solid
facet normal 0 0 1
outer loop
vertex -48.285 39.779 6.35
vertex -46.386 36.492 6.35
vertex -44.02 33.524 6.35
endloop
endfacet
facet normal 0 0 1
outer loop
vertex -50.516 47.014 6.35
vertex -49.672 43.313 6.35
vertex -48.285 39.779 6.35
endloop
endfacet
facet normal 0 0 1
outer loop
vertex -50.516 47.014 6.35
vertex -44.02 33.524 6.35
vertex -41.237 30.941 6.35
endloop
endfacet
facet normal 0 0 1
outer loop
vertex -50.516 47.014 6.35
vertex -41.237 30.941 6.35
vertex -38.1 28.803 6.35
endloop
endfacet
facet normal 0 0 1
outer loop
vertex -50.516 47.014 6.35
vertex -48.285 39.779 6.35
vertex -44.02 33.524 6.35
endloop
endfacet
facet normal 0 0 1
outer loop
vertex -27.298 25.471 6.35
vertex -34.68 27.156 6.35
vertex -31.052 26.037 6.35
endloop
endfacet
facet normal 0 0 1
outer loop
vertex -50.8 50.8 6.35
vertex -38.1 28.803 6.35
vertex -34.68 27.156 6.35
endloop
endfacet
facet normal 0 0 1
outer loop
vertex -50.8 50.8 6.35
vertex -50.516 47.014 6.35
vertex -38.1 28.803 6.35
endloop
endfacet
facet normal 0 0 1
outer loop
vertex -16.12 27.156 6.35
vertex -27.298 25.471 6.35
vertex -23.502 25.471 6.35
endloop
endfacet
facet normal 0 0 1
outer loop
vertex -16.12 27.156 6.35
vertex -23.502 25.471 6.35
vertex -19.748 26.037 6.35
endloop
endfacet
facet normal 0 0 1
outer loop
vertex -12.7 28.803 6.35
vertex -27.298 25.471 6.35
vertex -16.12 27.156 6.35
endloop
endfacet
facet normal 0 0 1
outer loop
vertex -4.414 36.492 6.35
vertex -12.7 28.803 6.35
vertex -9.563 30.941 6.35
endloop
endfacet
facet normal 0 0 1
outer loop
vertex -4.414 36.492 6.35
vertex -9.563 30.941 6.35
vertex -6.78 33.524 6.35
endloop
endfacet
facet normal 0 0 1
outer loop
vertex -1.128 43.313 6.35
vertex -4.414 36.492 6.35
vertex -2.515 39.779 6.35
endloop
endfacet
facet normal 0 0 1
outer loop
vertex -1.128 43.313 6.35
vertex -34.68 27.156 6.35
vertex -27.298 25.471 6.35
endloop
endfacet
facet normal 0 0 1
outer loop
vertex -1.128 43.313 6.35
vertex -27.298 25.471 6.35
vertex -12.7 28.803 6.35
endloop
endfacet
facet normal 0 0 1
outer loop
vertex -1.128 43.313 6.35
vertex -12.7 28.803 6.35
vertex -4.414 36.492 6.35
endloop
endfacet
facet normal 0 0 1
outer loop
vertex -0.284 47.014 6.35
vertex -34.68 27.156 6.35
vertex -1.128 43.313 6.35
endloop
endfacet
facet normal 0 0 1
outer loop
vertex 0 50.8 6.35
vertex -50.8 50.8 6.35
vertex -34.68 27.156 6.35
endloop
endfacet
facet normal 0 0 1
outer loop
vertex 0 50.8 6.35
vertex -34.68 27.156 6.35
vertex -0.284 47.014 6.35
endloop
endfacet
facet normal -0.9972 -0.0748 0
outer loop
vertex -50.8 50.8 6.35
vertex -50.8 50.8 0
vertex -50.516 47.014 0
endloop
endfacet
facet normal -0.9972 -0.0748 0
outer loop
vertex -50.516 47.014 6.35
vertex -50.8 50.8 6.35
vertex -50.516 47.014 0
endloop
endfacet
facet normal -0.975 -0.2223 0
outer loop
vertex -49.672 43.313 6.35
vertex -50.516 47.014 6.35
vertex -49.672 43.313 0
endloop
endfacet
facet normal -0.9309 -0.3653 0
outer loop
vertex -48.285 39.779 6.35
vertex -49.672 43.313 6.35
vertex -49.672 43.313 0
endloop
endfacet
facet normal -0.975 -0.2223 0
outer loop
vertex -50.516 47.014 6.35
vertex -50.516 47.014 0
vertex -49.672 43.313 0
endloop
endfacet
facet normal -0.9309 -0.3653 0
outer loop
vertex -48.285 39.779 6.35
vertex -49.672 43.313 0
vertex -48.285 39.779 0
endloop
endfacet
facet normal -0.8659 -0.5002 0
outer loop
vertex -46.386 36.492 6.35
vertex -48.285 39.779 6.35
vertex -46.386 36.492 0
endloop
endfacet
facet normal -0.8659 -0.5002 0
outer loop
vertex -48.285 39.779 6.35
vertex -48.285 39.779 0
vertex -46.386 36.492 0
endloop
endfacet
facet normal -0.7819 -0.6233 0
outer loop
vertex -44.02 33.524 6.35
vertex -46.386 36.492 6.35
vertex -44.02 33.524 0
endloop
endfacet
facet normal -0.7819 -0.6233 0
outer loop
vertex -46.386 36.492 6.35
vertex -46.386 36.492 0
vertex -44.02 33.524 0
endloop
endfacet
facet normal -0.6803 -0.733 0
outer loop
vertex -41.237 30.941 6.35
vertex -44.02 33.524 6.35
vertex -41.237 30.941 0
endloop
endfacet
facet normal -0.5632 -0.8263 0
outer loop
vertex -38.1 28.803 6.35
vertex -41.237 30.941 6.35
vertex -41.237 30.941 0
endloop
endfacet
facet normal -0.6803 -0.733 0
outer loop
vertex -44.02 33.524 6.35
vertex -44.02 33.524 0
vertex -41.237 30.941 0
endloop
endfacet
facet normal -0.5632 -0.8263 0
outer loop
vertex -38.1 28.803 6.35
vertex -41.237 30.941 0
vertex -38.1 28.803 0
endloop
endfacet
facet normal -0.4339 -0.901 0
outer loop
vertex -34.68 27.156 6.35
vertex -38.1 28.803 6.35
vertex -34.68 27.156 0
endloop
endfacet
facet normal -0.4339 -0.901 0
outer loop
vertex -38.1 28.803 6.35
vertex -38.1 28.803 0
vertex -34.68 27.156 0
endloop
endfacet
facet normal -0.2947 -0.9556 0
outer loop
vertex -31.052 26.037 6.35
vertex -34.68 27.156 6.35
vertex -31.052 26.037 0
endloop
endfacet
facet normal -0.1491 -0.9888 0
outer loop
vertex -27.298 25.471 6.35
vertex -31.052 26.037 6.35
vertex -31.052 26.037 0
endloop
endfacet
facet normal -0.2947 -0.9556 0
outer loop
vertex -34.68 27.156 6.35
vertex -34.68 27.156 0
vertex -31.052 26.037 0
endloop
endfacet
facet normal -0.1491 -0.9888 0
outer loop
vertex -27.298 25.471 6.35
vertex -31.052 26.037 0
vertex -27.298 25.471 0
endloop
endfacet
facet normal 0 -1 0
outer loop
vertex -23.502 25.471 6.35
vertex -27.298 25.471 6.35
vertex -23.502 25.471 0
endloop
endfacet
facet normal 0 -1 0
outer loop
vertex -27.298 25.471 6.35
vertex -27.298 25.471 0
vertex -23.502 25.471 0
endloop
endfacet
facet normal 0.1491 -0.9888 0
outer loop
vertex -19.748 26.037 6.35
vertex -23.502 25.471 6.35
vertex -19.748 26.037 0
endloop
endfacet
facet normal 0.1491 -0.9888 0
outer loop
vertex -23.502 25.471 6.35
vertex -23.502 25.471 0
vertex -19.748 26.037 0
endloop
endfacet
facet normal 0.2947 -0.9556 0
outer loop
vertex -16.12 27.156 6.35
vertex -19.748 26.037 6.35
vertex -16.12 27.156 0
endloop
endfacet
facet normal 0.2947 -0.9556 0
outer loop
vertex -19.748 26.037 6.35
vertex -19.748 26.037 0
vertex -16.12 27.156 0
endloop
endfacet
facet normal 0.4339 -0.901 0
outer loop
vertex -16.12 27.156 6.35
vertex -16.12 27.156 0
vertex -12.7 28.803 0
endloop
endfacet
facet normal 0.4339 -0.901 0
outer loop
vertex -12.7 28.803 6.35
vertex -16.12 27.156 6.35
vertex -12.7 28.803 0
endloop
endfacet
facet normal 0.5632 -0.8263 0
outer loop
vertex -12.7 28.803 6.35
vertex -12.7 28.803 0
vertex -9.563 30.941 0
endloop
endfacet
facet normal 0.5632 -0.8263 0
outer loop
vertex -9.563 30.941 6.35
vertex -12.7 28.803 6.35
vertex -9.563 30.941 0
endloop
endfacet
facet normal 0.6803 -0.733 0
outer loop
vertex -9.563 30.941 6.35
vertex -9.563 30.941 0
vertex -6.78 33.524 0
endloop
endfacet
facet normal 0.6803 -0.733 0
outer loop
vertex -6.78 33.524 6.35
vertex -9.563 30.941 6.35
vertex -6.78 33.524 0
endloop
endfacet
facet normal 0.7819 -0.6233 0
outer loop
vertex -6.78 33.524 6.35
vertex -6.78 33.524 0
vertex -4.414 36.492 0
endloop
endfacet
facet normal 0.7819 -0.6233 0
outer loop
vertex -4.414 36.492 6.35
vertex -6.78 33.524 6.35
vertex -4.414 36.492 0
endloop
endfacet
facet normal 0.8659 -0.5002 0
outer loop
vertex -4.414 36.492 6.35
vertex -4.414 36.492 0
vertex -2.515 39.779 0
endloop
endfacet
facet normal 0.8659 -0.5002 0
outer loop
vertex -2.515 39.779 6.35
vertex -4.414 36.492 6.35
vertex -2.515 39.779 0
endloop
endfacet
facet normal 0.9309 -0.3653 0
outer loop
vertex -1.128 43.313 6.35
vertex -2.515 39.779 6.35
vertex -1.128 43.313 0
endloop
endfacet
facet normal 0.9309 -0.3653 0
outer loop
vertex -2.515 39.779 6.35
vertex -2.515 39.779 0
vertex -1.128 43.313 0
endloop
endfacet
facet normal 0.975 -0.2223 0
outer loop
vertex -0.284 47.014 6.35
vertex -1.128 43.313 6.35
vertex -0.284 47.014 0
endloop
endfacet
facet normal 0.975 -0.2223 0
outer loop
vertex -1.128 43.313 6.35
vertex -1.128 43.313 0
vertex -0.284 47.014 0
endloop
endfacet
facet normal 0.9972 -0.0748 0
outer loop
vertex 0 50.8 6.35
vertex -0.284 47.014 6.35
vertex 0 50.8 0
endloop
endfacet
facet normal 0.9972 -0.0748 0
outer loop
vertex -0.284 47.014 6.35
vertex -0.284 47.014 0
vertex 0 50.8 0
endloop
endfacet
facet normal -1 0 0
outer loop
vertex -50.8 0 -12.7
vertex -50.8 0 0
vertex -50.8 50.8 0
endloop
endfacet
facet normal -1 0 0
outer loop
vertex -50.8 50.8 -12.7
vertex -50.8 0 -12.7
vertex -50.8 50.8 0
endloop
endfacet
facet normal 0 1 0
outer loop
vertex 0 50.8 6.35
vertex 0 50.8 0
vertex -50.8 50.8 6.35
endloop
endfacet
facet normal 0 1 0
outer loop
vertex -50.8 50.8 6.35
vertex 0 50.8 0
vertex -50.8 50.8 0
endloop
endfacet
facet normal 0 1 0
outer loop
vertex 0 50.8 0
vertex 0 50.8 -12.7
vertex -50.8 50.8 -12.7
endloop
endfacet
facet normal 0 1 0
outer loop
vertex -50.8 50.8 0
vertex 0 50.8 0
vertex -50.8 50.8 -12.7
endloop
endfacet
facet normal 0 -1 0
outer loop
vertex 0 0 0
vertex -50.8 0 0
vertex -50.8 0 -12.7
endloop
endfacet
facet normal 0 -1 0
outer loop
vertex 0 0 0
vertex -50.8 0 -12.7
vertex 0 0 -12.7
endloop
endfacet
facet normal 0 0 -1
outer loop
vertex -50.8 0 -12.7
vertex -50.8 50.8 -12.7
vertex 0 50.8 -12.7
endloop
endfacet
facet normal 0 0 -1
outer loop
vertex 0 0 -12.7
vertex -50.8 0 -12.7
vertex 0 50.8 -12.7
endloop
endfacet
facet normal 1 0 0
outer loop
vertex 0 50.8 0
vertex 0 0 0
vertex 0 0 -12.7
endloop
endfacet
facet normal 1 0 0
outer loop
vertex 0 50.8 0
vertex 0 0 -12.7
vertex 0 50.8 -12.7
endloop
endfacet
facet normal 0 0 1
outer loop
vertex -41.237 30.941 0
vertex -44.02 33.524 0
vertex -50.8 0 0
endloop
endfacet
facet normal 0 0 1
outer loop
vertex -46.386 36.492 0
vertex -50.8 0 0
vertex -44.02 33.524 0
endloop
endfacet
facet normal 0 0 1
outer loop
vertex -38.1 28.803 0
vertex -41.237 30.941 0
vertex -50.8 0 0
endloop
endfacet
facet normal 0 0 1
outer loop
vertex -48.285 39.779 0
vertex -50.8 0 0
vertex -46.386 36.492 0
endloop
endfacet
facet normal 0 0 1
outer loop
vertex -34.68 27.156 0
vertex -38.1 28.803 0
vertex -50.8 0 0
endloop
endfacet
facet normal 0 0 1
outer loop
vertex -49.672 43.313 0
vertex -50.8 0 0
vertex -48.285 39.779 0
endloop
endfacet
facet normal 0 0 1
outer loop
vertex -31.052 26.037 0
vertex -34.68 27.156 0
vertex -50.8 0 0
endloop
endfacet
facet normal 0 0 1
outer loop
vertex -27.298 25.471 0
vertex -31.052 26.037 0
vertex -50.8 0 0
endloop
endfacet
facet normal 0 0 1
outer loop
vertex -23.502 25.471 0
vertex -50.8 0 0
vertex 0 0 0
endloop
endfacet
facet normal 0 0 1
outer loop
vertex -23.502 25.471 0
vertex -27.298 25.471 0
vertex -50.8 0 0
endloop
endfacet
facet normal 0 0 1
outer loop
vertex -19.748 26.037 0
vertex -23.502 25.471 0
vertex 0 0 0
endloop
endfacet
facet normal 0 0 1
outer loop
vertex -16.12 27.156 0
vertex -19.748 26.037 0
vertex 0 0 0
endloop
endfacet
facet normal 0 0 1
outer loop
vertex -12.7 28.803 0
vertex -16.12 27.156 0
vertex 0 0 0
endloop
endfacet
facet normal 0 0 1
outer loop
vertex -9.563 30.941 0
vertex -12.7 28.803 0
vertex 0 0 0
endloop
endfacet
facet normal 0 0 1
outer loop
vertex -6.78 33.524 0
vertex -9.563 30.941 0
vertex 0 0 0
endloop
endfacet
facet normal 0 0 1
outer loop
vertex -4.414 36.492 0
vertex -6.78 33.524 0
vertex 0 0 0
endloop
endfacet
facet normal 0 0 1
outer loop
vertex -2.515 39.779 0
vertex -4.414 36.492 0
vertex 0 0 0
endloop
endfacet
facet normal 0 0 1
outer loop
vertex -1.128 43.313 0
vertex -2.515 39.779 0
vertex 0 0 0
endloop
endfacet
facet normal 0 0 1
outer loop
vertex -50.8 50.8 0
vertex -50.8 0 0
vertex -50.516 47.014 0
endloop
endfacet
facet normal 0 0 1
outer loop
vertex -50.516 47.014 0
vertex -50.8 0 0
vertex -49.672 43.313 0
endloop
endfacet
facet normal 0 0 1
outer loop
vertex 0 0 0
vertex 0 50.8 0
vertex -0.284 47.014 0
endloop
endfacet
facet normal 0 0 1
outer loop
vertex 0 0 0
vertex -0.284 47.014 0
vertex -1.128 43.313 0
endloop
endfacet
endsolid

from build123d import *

# Parameters (mm, degrees)
F0_W     = 50.8
F0_H     = 50.8
F1_DEPTH = 12.7
F3_DEPTH = 6.35


with BuildPart() as f1:
    # F0 (on Top) → F1 (new body)
    with BuildSketch(Plane.XY):
        with Locations((-25.4, 25.4)):
            Rectangle(F0_W, F0_H)
    extrude(amount=-F1_DEPTH)

    # F2 (on face) → F3 (join)
    with BuildSketch(Plane.XY):
        with BuildLine():
            Line((0, 50.8), (-50.8, 50.8))
            ThreePointArc((-50.8, 50.8), (-25.4, 25.4), (0, 50.8))
        make_face()
    extrude(amount=F3_DEPTH)


solid = f1.part
